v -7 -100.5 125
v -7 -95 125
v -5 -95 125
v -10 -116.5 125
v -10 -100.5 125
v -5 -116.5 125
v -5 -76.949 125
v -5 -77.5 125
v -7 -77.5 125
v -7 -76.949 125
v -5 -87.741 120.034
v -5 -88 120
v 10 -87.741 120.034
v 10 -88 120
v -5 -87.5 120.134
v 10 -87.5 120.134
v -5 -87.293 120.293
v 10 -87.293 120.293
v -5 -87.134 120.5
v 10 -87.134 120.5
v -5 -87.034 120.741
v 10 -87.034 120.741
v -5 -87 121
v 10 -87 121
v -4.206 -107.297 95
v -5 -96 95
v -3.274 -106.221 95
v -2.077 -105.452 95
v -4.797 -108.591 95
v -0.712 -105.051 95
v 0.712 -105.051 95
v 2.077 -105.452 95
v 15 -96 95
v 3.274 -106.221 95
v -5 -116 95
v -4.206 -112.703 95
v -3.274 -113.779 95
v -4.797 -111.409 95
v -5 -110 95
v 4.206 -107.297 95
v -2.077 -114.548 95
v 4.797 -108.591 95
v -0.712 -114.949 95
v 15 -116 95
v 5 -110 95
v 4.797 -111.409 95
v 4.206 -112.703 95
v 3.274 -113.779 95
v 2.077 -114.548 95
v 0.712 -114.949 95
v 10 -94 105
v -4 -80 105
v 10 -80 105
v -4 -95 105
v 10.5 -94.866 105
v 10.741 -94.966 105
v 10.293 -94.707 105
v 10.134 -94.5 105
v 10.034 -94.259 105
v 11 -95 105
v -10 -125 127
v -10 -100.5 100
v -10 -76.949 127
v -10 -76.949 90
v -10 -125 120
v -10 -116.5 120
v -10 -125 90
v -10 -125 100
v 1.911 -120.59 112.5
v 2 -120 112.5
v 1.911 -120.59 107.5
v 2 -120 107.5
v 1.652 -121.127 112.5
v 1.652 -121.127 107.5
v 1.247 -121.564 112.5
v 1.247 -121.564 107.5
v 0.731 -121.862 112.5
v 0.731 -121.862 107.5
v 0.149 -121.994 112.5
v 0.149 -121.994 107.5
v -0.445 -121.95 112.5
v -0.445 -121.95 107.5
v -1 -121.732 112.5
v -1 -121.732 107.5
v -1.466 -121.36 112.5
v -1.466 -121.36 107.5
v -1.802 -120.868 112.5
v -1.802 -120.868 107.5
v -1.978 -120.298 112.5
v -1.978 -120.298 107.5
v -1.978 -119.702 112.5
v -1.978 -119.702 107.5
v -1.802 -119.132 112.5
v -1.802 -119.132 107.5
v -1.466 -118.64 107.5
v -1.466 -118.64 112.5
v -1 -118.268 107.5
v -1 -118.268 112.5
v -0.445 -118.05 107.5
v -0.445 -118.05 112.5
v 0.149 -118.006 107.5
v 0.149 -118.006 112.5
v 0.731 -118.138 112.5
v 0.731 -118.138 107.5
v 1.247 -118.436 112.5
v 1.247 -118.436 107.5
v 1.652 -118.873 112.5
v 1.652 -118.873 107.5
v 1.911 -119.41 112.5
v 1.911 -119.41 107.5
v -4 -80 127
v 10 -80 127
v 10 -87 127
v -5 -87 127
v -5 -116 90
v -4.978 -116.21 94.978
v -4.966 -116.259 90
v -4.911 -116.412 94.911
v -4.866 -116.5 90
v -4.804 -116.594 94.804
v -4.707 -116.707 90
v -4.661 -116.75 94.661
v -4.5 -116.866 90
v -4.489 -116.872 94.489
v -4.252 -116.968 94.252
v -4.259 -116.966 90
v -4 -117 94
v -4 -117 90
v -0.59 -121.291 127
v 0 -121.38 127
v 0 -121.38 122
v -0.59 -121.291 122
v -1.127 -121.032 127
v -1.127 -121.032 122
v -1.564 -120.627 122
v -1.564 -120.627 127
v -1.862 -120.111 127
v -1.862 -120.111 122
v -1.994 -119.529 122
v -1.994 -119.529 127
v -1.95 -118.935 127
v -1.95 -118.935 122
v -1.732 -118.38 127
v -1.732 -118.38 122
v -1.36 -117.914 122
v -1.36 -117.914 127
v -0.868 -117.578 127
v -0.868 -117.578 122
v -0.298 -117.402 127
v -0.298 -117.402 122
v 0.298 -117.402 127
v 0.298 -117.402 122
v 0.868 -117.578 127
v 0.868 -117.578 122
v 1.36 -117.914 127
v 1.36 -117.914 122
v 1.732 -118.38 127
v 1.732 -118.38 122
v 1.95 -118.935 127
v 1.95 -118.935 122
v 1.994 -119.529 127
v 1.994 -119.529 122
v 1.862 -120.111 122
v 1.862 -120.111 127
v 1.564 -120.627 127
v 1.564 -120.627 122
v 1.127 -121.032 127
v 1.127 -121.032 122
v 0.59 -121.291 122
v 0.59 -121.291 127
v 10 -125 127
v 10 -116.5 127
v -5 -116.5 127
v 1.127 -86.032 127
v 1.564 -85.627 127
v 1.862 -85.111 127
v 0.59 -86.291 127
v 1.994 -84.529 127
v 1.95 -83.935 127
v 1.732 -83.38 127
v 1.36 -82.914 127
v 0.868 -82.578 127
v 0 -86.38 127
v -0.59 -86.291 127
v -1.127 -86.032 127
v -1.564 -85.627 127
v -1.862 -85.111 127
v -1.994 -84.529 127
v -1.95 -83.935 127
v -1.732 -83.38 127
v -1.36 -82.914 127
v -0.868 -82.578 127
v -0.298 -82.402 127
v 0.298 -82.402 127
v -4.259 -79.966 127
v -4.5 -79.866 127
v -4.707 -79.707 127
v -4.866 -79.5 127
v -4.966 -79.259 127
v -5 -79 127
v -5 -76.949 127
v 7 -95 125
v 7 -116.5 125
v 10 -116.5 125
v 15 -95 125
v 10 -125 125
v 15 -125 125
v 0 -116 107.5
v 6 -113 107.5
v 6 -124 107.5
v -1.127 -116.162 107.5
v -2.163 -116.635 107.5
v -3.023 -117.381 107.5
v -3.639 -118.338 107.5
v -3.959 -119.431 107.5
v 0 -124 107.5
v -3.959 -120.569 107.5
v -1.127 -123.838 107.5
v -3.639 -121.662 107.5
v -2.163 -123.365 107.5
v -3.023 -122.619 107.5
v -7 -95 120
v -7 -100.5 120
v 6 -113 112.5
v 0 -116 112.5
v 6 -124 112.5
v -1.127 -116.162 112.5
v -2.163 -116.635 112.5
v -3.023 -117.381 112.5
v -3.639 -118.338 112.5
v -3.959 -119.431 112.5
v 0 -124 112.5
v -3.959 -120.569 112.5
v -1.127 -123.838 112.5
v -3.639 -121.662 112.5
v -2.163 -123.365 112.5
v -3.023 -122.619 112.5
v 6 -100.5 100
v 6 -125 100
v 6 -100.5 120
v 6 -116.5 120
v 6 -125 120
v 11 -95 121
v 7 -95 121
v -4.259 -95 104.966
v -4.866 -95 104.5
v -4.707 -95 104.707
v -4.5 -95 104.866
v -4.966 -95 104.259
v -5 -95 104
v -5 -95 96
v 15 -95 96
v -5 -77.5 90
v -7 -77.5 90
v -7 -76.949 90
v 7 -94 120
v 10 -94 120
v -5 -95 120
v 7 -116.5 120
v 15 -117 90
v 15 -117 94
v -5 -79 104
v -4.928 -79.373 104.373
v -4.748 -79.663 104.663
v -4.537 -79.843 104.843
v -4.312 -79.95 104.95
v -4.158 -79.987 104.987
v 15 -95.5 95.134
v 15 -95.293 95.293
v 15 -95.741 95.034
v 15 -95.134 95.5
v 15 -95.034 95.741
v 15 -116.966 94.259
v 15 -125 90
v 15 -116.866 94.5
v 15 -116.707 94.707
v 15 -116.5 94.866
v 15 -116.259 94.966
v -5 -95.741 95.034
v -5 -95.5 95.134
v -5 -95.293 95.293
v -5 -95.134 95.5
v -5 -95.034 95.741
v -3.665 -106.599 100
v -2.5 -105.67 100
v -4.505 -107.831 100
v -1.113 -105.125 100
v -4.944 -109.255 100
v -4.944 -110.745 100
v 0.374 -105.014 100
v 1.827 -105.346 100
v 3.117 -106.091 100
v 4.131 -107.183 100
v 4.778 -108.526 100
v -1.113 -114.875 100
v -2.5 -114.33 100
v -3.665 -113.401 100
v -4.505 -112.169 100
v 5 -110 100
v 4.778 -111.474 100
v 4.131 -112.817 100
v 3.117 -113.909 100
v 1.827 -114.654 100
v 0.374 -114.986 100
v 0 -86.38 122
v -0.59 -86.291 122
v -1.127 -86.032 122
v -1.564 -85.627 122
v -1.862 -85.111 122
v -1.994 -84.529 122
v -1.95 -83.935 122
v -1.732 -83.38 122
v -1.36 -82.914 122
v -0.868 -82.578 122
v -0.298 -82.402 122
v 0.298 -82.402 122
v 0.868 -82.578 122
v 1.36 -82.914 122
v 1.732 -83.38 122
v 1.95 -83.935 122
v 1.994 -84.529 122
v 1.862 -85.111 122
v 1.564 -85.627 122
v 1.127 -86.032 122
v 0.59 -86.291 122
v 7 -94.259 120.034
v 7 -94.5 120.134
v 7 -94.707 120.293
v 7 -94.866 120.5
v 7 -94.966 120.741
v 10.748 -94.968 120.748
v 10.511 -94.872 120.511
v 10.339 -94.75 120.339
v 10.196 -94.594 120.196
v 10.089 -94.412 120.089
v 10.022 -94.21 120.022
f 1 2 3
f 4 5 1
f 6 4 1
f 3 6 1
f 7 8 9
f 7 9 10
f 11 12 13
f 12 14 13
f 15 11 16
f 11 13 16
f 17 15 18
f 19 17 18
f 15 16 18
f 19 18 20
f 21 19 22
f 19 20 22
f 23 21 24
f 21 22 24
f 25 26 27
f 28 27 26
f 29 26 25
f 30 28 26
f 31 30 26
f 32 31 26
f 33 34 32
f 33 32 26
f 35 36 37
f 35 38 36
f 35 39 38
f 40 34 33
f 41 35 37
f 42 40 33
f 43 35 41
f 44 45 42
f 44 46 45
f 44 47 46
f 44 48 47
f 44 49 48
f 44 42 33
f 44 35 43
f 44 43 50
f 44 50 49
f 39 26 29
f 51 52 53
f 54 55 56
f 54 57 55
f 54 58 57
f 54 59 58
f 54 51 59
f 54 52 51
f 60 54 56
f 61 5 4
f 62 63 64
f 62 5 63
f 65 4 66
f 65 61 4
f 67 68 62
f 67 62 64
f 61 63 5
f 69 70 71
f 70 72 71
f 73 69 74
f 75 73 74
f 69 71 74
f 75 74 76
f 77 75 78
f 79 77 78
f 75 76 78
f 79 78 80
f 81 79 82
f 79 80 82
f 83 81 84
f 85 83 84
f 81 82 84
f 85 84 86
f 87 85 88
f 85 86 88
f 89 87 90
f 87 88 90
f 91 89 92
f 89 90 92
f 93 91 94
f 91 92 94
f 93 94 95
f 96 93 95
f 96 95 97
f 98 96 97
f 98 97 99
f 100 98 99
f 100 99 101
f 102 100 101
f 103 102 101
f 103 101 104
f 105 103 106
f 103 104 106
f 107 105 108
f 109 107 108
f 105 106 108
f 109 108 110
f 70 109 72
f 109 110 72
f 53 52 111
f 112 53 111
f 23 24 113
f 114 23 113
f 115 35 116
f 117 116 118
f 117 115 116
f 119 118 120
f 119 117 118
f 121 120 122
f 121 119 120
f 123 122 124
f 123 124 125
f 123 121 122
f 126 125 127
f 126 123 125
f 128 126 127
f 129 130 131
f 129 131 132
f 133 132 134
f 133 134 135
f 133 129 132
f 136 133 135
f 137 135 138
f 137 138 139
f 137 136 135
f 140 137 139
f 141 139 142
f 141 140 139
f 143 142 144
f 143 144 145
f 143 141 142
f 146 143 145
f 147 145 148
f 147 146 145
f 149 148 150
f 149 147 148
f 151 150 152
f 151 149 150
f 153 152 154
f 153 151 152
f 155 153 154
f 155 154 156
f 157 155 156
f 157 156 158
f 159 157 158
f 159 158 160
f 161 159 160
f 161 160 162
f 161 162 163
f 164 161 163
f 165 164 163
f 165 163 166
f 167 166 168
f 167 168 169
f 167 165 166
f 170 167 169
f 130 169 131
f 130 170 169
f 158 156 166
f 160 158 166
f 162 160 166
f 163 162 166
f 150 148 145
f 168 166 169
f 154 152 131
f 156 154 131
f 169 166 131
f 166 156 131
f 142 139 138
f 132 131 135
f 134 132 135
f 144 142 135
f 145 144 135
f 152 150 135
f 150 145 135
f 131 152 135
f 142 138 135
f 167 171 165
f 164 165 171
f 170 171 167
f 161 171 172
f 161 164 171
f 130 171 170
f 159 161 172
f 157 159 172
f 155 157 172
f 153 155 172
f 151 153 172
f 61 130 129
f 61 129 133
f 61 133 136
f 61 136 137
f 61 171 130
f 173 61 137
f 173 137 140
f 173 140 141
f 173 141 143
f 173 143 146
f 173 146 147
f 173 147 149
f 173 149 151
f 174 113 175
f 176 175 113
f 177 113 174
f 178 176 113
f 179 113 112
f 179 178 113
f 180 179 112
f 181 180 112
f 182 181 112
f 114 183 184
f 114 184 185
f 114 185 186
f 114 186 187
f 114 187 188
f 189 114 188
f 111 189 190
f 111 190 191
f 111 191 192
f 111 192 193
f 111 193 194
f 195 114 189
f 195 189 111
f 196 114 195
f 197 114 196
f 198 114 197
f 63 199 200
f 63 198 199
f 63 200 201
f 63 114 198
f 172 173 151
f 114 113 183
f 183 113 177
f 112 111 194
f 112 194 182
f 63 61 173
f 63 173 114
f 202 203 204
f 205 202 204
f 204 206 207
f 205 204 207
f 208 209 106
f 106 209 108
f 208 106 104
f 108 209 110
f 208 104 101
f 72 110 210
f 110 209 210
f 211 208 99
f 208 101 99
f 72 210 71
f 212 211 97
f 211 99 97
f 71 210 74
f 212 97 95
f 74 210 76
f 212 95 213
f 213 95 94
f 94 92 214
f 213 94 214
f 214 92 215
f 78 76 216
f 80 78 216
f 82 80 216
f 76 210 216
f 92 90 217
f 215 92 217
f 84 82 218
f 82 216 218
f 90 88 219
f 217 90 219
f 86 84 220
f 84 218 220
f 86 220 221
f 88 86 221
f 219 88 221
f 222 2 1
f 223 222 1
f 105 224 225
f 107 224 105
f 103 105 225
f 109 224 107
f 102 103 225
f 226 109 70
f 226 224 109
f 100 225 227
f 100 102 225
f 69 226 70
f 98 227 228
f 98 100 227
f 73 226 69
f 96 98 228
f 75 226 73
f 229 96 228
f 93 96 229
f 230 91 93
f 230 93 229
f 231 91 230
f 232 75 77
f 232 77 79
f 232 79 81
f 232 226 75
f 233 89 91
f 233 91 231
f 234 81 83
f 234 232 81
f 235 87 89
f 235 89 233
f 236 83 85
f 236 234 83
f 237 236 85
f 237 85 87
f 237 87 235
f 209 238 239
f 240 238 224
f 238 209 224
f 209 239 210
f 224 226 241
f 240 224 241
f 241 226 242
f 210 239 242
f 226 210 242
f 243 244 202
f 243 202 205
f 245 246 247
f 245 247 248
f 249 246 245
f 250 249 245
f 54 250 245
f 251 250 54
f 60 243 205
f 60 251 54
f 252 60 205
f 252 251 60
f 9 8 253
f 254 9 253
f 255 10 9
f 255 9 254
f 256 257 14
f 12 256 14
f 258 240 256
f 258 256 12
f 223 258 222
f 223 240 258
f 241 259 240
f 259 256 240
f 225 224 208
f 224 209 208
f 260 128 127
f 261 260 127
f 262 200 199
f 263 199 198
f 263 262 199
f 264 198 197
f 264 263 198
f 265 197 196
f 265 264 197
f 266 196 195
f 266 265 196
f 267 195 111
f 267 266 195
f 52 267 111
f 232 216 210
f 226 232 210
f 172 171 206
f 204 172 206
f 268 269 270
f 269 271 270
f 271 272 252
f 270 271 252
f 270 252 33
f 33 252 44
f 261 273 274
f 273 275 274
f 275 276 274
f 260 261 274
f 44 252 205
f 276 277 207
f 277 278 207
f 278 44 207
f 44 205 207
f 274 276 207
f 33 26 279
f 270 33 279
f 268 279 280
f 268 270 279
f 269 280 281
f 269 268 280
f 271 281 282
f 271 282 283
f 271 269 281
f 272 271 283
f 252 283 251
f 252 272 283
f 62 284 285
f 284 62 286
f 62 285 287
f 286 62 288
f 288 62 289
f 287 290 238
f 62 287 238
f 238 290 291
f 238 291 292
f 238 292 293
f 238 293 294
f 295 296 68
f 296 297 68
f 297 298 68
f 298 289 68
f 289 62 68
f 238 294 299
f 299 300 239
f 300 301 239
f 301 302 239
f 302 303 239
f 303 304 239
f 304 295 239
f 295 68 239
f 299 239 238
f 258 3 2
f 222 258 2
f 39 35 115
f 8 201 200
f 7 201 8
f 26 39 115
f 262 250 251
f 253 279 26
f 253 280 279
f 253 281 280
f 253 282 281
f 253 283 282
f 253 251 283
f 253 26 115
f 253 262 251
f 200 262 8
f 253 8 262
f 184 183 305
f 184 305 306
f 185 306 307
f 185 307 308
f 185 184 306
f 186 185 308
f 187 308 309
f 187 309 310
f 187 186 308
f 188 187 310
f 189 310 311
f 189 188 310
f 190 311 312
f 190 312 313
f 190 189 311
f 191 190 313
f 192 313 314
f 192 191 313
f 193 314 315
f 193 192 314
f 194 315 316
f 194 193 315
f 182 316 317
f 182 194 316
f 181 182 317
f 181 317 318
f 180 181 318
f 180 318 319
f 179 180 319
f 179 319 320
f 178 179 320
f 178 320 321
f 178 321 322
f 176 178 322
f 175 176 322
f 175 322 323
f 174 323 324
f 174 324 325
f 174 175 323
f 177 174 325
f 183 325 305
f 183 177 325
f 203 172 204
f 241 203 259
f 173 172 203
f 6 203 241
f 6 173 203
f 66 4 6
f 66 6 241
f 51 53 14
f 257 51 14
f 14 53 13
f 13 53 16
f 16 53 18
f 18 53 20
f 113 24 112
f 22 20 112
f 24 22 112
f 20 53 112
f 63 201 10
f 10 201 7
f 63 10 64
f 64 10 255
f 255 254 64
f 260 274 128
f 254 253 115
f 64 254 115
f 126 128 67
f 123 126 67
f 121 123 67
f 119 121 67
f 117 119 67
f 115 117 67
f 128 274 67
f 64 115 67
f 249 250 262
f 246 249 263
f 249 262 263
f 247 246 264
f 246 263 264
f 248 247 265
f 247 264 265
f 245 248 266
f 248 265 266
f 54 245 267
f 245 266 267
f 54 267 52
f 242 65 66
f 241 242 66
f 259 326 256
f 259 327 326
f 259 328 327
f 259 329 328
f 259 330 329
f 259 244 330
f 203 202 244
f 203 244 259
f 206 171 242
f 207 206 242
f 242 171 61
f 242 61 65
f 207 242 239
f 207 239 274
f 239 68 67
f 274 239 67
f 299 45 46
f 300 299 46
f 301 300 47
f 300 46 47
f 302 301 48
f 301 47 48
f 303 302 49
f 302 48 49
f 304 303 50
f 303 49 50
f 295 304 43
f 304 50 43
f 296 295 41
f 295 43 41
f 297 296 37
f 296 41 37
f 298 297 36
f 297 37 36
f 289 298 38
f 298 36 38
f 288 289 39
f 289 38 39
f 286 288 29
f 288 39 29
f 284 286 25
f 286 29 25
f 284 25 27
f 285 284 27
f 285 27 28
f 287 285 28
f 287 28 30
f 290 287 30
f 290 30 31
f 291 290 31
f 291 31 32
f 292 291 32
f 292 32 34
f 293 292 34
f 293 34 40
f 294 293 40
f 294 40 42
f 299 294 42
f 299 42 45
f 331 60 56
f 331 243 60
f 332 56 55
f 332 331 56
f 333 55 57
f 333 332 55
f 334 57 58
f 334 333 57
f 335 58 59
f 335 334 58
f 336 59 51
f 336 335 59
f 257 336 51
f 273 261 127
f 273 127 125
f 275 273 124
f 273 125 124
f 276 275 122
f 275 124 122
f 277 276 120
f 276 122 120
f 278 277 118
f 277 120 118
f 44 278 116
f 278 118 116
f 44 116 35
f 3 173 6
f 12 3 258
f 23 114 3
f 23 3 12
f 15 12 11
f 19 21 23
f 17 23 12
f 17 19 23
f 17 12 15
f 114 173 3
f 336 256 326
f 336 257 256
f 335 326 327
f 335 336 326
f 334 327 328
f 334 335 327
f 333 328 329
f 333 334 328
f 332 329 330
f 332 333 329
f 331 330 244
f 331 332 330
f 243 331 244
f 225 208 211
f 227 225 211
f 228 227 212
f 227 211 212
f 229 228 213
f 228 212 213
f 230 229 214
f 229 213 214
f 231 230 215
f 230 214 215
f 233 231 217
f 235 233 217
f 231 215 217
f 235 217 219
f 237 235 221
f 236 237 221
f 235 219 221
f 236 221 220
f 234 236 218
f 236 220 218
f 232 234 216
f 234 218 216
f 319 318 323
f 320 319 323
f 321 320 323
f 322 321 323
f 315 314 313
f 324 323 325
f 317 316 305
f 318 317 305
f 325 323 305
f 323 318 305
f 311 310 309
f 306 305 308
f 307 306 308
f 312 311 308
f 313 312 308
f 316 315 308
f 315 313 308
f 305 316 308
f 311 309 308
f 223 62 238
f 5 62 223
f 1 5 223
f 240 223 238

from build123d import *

# Parameters (mm, degrees)
SKETCH_2_W                                 = 30
SKETCH_2_H                                 = 30
EXTRUDE_2_DEPTH                            = 15
SKETCH_3_W                                 = 21
SKETCH_3_H                                 = 25
CUT_EXTRUDE_1_DEPTH                        = 24.5
SKETCH_4_R                                 = 5
CUT_EXTRUDE_2_DEPTH                        = 37.742346142
EXTRUDE_3_DEPTH                            = 2.5
SKETCH_6_W                                 = 14
SKETCH_6_H                                 = 30
CUT_EXTRUDE_3_DEPTH                        = 5
SKETCH_8_R                                 = 2
CUT_EXTRUDE_4_DEPTH                        = 2.5
EXTRUDE_4_DEPTH                            = 10
MIRROR_18_AT_THE_SECOND_PLANE_COPY_1_SKE_W = 30
MIRROR_18_AT_THE_SECOND_PLANE_COPY_1_SKE_H = 30
MIRROR_18_AT_THE_SECOND_PLANE_COPY_1_DEPTH = 15
MIRROR_18_AT_THE_SECOND_PLANE_COPY_2_SKE_W = 21
MIRROR_18_AT_THE_SECOND_PLANE_COPY_2_SKE_H = 25
MIRROR_18_AT_THE_SECOND_PLANE_COPY_2_DEPTH = 24.5
MIRROR_18_AT_THE_SECOND_PLANE_COPY_3_SKE_R = 5
MIRROR_18_AT_THE_SECOND_PLANE_COPY_3_DEPTH = 37.742346142
MIRROR_14_AT_THE_SECOND_PLANE_COPY_1_DEPTH = 2.5
MIRROR_14_AT_THE_SECOND_PLANE_COPY_2_SKE_R = 2
MIRROR_14_AT_THE_SECOND_PLANE_COPY_2_DEPTH = 2.5
MIRROR_19_AT_THE_SECOND_PLANE_COPY_1_SKE_W = 14
MIRROR_19_AT_THE_SECOND_PLANE_COPY_1_SKE_H = 30
MIRROR_19_AT_THE_SECOND_PLANE_COPY_1_DEPTH = 5
SKETCH_10_W                                = 90
SKETCH_10_H                                = 8
EXTRUDE_5_DEPTH                            = 30
EXTRUDE_6_DEPTH                            = 15
EXTRUDE_6_DEPTH_BACK                       = 10
SKETCH_11_W                                = 7
SKETCH_11_H                                = 8.5
SKETCH_12_W                                = 140
SKETCH_12_H                                = 45
CUT_EXTRUDE_5_DEPTH                        = 2
SKETCH_15_R                                = 2.5
SKETCH_15_W                                = 15
SKETCH_15_H                                = 40
SKETCH_15_W_2                              = 25
SKETCH_15_H_2                              = 11.861851271
CUT_EXTRUDE_7_DEPTH                        = 201.124960962
SKETCH_14_R                                = 2
CUT_EXTRUDE_6_DEPTH                        = 5
FILLET_1_R                                 = 5
SKETCH_17_R                                = 2
CUT_EXTRUDE_8_DEPTH                        = 5
SKETCH_14_6_R                              = 2
CUT_EXTRUDE_9_DEPTH                        = 25
SKETCH_18_R                                = 4.3
CUT_EXTRUDE_10_DEPTH                       = 6
FILLET_2_R                                 = 1
CUT_EXTRUDE_11_DEPTH                       = 171.73371079
CUT_EXTRUDE_11_DEPTH_BACK                  = 171.73371079
SKETCH_19_W                                = 5
SKETCH_19_H                                = 200
CUT_EXTRUDE_12_DEPTH                       = 201.686322404


with BuildPart() as part:
    # 草圖2 → 填料-伸長2 (new, symmetric)
    with BuildSketch(Plane.XY):
        Rectangle(SKETCH_2_W, SKETCH_2_H)
    extrude_2 = extrude(amount=EXTRUDE_2_DEPTH, both=True)

    # 草圖3 → 除料-伸長1 (cut)
    with BuildSketch(Plane(origin=(0, 15, 0), x_dir=(1, 0, 0), z_dir=(0, 1, 0))):
        with Locations((-4.5, 2.5)):
            Rectangle(SKETCH_3_W, SKETCH_3_H)
    cut_extrude_1 = extrude(amount=-CUT_EXTRUDE_1_DEPTH, mode=Mode.SUBTRACT)

    # 草圖4 → 除料-伸長2 (cut, through all)
    with BuildSketch(Plane.XY.offset(15)):
        Circle(SKETCH_4_R)
    cut_extrude_2 = extrude(amount=-CUT_EXTRUDE_2_DEPTH, mode=Mode.SUBTRACT)

    # 草圖6 → 除料-伸長3 (cut)
    with BuildSketch(Plane(origin=(0, 0, -15), x_dir=(-1, 0, 0), z_dir=(0, 0, -1))):
        Rectangle(SKETCH_6_W, SKETCH_6_H)
    cut_extrude_3 = extrude(amount=-CUT_EXTRUDE_3_DEPTH, mode=Mode.SUBTRACT)

    # 草圖9 → 填料-伸長4 (add)
    with BuildSketch(Plane.ZY.offset(15)):
        Polygon((-45, 15), (-10, 15), (-10, -9.5), (10, -9.5), (10, 15), (100, 15), (100, -9.5), (120, -9.5), (120, 15), (155, 15), (155, -125), (120, -125), (120, -100.5), (100, -100.5), (100, -125), (10, -125), (10, -100.5), (-10, -100.5), (-10, -125), (-45, -125), align=None)
    extrude(amount=-EXTRUDE_4_DEPTH)

    # 鏡射18: 填料-伸長2, 除料-伸長1, 除料-伸長2 across plane
    add(extrude_2.mirror(Plane.ZX.offset(-55)))
    add(cut_extrude_1.mirror(Plane.ZX.offset(-55)), mode=Mode.SUBTRACT)
    add(cut_extrude_2.mirror(Plane.ZX.offset(-55)), mode=Mode.SUBTRACT)

    # 鏡射18 at the second plane: 填料-伸長2, 除料-伸長1, 除料-伸長2 across plane
    add(extrude_2.mirror(Plane.XY.offset(55)))
    add(cut_extrude_1.mirror(Plane.XY.offset(55)), mode=Mode.SUBTRACT)
    add(cut_extrude_2.mirror(Plane.XY.offset(55)), mode=Mode.SUBTRACT)

    # 鏡射18 at the second plane copy 1 ske → 鏡射18 at the second plane copy 1 (add, symmetric)
    with BuildSketch(Plane(origin=(0, -110, 110), x_dir=(1, 0, 0), z_dir=(0, 0, -1))):
        Rectangle(MIRROR_18_AT_THE_SECOND_PLANE_COPY_1_SKE_W, MIRROR_18_AT_THE_SECOND_PLANE_COPY_1_SKE_H)
    extrude(amount=MIRROR_18_AT_THE_SECOND_PLANE_COPY_1_DEPTH, both=True)

    # 鏡射18 at the second plane copy 2 ske → 鏡射18 at the second plane copy 2 (cut)
    with BuildSketch(Plane(origin=(0, -125, 110), x_dir=(1, 0, 0), z_dir=(0, -1, 0))):
        with Locations((-4.5, 2.5)):
            Rectangle(MIRROR_18_AT_THE_SECOND_PLANE_COPY_2_SKE_W, MIRROR_18_AT_THE_SECOND_PLANE_COPY_2_SKE_H)
    extrude(amount=-MIRROR_18_AT_THE_SECOND_PLANE_COPY_2_DEPTH, mode=Mode.SUBTRACT)

    # 鏡射18 at the second plane copy 3 ske → 鏡射18 at the second plane copy 3 (cut, through all)
    with BuildSketch(Plane(origin=(0, -110, 95), x_dir=(1, 0, 0), z_dir=(0, 0, -1))):
        Circle(MIRROR_18_AT_THE_SECOND_PLANE_COPY_3_SKE_R)
    extrude(amount=-MIRROR_18_AT_THE_SECOND_PLANE_COPY_3_DEPTH, mode=Mode.SUBTRACT)


with BuildPart() as body_2:
    # 草圖5 → 填料-伸長3 (new, symmetric)
    with BuildSketch(Plane.XY):
        with BuildLine():
            Line((0, 14), (6, 14))
            Line((6, 14), (6, 6))
            Line((6, 6), (6, 3))
            Line((6, 3), (0, 6))
            ThreePointArc((0, 6), (-4, 10), (0, 14))
        make_face()
    extrude_3 = extrude(amount=EXTRUDE_3_DEPTH, both=True)

    # 草圖8 → 除料-伸長4 (cut, symmetric)
    with BuildSketch(Plane.XY):
        with Locations((0, 10)):
            Circle(SKETCH_8_R)
    cut_extrude_4 = extrude(amount=CUT_EXTRUDE_4_DEPTH, both=True, mode=Mode.SUBTRACT)


with BuildPart() as part_1:
    add(part.part)

    # 鏡射14: 填料-伸長3, 除料-伸長4 across plane
    add(extrude_3.mirror(Plane.ZX.offset(-55)))
    add(cut_extrude_4.mirror(Plane.ZX.offset(-55)), mode=Mode.SUBTRACT)

    # 鏡射14 at the second plane: 填料-伸長3, 除料-伸長4 across plane
    add(extrude_3.mirror(Plane.XY.offset(55)))
    add(cut_extrude_4.mirror(Plane.XY.offset(55)), mode=Mode.SUBTRACT)

    # 鏡射14 at the second plane copy 1 ske → 鏡射14 at the second plane copy 1 (add, symmetric)
    with BuildSketch(Plane(origin=(0, -110, 110), x_dir=(1, 0, 0), z_dir=(0, 0, -1))):
        with BuildLine():
            Line((0, 14), (6, 14))
            Line((6, 14), (6, 6))
            Line((6, 6), (6, 3))
            Line((6, 3), (0, 6))
            ThreePointArc((0, 6), (-4, 10), (0, 14))
        make_face()
    extrude(amount=MIRROR_14_AT_THE_SECOND_PLANE_COPY_1_DEPTH, both=True)

    # 鏡射14 at the second plane copy 2 ske → 鏡射14 at the second plane copy 2 (cut, symmetric)
    with BuildSketch(Plane(origin=(0, -110, 110), x_dir=(1, 0, 0), z_dir=(0, 0, -1))):
        with Locations((0, 10)):
            Circle(MIRROR_14_AT_THE_SECOND_PLANE_COPY_2_SKE_R)
    extrude(amount=MIRROR_14_AT_THE_SECOND_PLANE_COPY_2_DEPTH, both=True, mode=Mode.SUBTRACT)

    # 鏡射19: 除料-伸長3 across plane
    add(cut_extrude_3.mirror(Plane.XY.offset(55)), mode=Mode.SUBTRACT)

    # 鏡射19 at the second plane: 除料-伸長3 across plane
    add(cut_extrude_3.mirror(Plane.ZX.offset(-55)), mode=Mode.SUBTRACT)

    # 鏡射19 at the second plane copy 1 ske → 鏡射19 at the second plane copy 1 (cut)
    with BuildSketch(Plane(origin=(0, -110, 125), x_dir=(-1, 0, 0), z_dir=(0, 0, 1))):
        Rectangle(MIRROR_19_AT_THE_SECOND_PLANE_COPY_1_SKE_W, MIRROR_19_AT_THE_SECOND_PLANE_COPY_1_SKE_H)
    extrude(amount=-MIRROR_19_AT_THE_SECOND_PLANE_COPY_1_DEPTH, mode=Mode.SUBTRACT)

    # 草圖10 → 填料-伸長5 (add)
    with BuildSketch(Plane.ZY.offset(15)):
        with Locations((55, 11)):
            Rectangle(SKETCH_10_W, SKETCH_10_H)
        with Locations((55, -121)):
            Rectangle(SKETCH_10_W, SKETCH_10_H)
    extrude(amount=-EXTRUDE_5_DEPTH)

    # 草圖11 → 填料-伸長6 (add, two sides: drawn at the far end of the back side and taken through both)
    with BuildSketch(Plane(origin=(-5, 0, 0), x_dir=(0, 0, -1), z_dir=(1, 0, 0)).offset(-EXTRUDE_6_DEPTH_BACK)):
        with Locations((13.5, 10.75)):
            Rectangle(SKETCH_11_W, SKETCH_11_H)
        with Locations((13.5, -120.75)):
            Rectangle(SKETCH_11_W, SKETCH_11_H)
        Polygon((12.973156493, -80), (17, -80), (17, -87), (10, -87), (10, -95), (-5, -95), (-5, -80), align=None)
        with Locations((-123.5, -120.75)):
            Rectangle(SKETCH_11_W, SKETCH_11_H)
        Polygon((-120, -87), (-127, -87), (-127, -80), (-122.973156493, -80), (-105, -80), (-105, -95), (-120, -95), align=None)
        Polygon((10, -23), (17, -23), (17, -30), (12.973156493, -30), (-5, -30), (-5, -15), (10, -15), align=None)
        Polygon((-122.973156493, -30), (-127, -30), (-127, -23), (-120, -23), (-120, -15), (-105, -15), (-105, -30), align=None)
        with Locations((-123.5, 10.75)):
            Rectangle(SKETCH_11_W, SKETCH_11_H)
    extrude(amount=EXTRUDE_6_DEPTH + EXTRUDE_6_DEPTH_BACK)

    # 草圖12 → 除料-伸長5 (cut)
    with BuildSketch(Plane(origin=(-5, 0, 0), x_dir=(0, 0, -1), z_dir=(1, 0, 0))):
        with Locations((-55, -55)):
            Rectangle(SKETCH_12_W, SKETCH_12_H)
    extrude(amount=-CUT_EXTRUDE_5_DEPTH, mode=Mode.SUBTRACT)

    # 草圖15 → 除料-伸長7 (cut, through all)
    with BuildSketch(Plane(origin=(-5, 0, 0), x_dir=(0, 0, -1), z_dir=(1, 0, 0))):
        with Locations(Location((30, -90, 0), (0, 0, 270))):
            Circle(SKETCH_15_R)
        with Locations(Location((-55, -90, 0), (0, 0, 270))):
            Circle(SKETCH_15_R)
        with Locations(Location((-140, -90, 0), (0, 0, 270))):
            Circle(SKETCH_15_R)
        with Locations(Location((-140, -20, 0), (0, 0, 90))):
            Circle(SKETCH_15_R)
        with Locations(Location((30, -20, 0), (0, 0, 90))):
            Circle(SKETCH_15_R)
        with Locations(Location((-55, -20, 0), (0, 0, 90))):
            Circle(SKETCH_15_R)
        with Locations((-139.005709801, -55)):
            Rectangle(SKETCH_15_W, SKETCH_15_H)
        with Locations((29.005709801, -55)):
            Rectangle(SKETCH_15_W, SKETCH_15_H)
        with Locations((-77.5, -30)):
            Rectangle(SKETCH_15_W_2, SKETCH_15_H)
        with Locations((-77.5, -80)):
            Rectangle(SKETCH_15_W_2, SKETCH_15_H)
        with Locations((-32.5, -80)):
            Rectangle(SKETCH_15_W_2, SKETCH_15_H)
        with Locations((-32.5, -30)):
            Rectangle(SKETCH_15_W_2, SKETCH_15_H)
        with Locations((-139.005709801, -106.804819835)):
            Rectangle(SKETCH_15_W, SKETCH_15_H_2)
        with Locations((-139.005709801, -3.195180166)):
            Rectangle(SKETCH_15_W, SKETCH_15_H_2)
        with Locations((29.005709801, -106.804819835)):
            Rectangle(SKETCH_15_W, SKETCH_15_H_2)
        with Locations((29.005709801, -3.195180166)):
            Rectangle(SKETCH_15_W, SKETCH_15_H_2)
    extrude(amount=-CUT_EXTRUDE_7_DEPTH, mode=Mode.SUBTRACT)

    # 草圖14 → 除料-伸長6 (cut)
    with BuildSketch(Plane(origin=(15, 0, 0), x_dir=(0, 0, -1), z_dir=(1, 0, 0))):
        with Locations(Location((-55, 11, 0), (0, 0, 90))):
            Circle(SKETCH_14_R)
        with Locations(Location((-55, -121, 0), (0, 0, 270))):
            Circle(SKETCH_14_R)
    extrude(amount=-CUT_EXTRUDE_6_DEPTH, mode=Mode.SUBTRACT)

    # 圓角1
    fillet_1_edges = [part_1.edges().sort_by_distance(p)[0] for p in [
        (-10, -125, -45),
        (-10, 15, -45),
        (-10, 15, 155),
        (-10, -125, 155),
        (-10, -75, 146.505709801),
        (-10, -35, 146.505709801),
        (-10, -35, 131.505709801),
        (-10, -75, 131.505709801),
        (-10, -35, -36.505709801),
        (-10, -75, -36.505709801),
        (-10, -75, -21.505709801),
        (-10, -35, -21.505709801),
    ]]
    fillet(fillet_1_edges, radius=FILLET_1_R)

    # 草圖17 → 除料-伸長8 (cut)
    with BuildSketch(Plane(origin=(0, 0, -17), x_dir=(-1, 0, 0), z_dir=(0, 0, -1))):
        with Locations(Location((0, 9.38, 0), (0, 0, 90))):
            Circle(SKETCH_17_R)
        with Locations(Location((0, -25.62, 0), (0, 0, 90))):
            Circle(SKETCH_17_R)
        with Locations(Location((0, -84.38, 0), (0, 0, 270))):
            Circle(SKETCH_17_R)
        with Locations(Location((0, -119.38, 0), (0, 0, 270))):
            Circle(SKETCH_17_R)
    cut_extrude_8 = extrude(amount=-CUT_EXTRUDE_8_DEPTH, mode=Mode.SUBTRACT)

    # 鏡射20: 除料-伸長8 across plane
    add(cut_extrude_8.mirror(Plane.XY.offset(55)), mode=Mode.SUBTRACT)

    # 草圖14<6> → 除料-伸長9 (cut)
    with BuildSketch(Plane(origin=(15, 0, 0), x_dir=(0, 0, -1), z_dir=(1, 0, 0))):
        with Locations(Location((39, 9, 0), (0, 0, 90))):
            Circle(SKETCH_14_6_R)
        with Locations(Location((-149, 9, 0), (0, 0, 270))):
            Circle(SKETCH_14_6_R)
        with Locations(Location((39, -119, 0), (0, 0, 270))):
            Circle(SKETCH_14_6_R)
        with Locations(Location((-149, -119, 0), (0, 0, 90))):
            Circle(SKETCH_14_6_R)
    extrude(amount=-CUT_EXTRUDE_9_DEPTH, mode=Mode.SUBTRACT)

    # 草圖18 → 除料-伸長10 (cut)
    with BuildSketch(Plane(origin=(-5, 0, 0), x_dir=(0, 0, -1), z_dir=(1, 0, 0))):
        with Locations(Location((30, -90, 0), (0, 0, 90))):
            Circle(SKETCH_18_R)
        with Locations(Location((-55, -90, 0), (0, 0, 90))):
            Circle(SKETCH_18_R)
        with Locations(Location((-140, -90, 0), (0, 0, 90))):
            Circle(SKETCH_18_R)
        with Locations(Location((-140, -20, 0), (0, 0, 90))):
            Circle(SKETCH_18_R)
        with Locations(Location((-55, -20, 0), (0, 0, 90))):
            Circle(SKETCH_18_R)
        with Locations(Location((30, -20, 0), (0, 0, 90))):
            Circle(SKETCH_18_R)
    extrude(amount=-CUT_EXTRUDE_10_DEPTH, mode=Mode.SUBTRACT)

    # 圓角2
    fillet_2_edges = [part_1.edges().sort_by_distance(p)[0] for p in [
        (5, -15, 95),
        (5, -95, 15),
        (5, -95, 95),
        (-5, 7, 55),
        (5, 7, 15),
        (5, 7, 95),
        (-5, -117, 55),
        (5, -117, 15),
        (5, -117, 95),
        (-5, -80, 116),
        (2.5, -87, 120),
        (8.5, -95, 120),
        (-5, -87.5, 105),
        (10, -95, 112.5),
        (-5, -22.5, 105),
        (-5, -30, 116),
        (2.5, -23, 120),
        (8.5, -15, 120),
        (10, -15, 112.5),
        (-5, -30, -6),
        (8.5, -15, -10),
        (2.5, -23, -10),
        (10, -15, -2.5),
        (5, -15, 15),
        (-5, -80, -6),
        (2.5, -87, -10),
        (8.5, -95, -10),
        (10, -95, -2.5),
    ]]
    fillet(fillet_2_edges, radius=FILLET_2_R)

    # 草圖19 → 除料-伸長11 (cut, two sides: drawn at the far end of the back side and taken through both)
    with BuildSketch(Plane(origin=(0, -55, 0), x_dir=(1, 0, 0), z_dir=(0, 1, 0)).offset(-CUT_EXTRUDE_11_DEPTH_BACK)):
        Polygon((-5, -20), (-5, -38.623236893), (10, -20), align=None)
        Polygon((10, -26.376763107), (-5, -45), (10, -45), align=None)
        Polygon((10, -90), (-5, -90), (-5, -71.376763107), align=None)
        Polygon((-5, -65), (10, -65), (10, -83.623236893), align=None)
        with Locations((-12.5, -55)):
            Rectangle(SKETCH_19_W, SKETCH_19_H)
    extrude(amount=CUT_EXTRUDE_11_DEPTH + CUT_EXTRUDE_11_DEPTH_BACK, mode=Mode.SUBTRACT)


with BuildPart() as cut_extrude_12_tool:
    # 草圖20 → 除料-伸長12 (new, through all)
    with BuildSketch(Plane(origin=(15, 0, 0), x_dir=(0, 0, -1), z_dir=(1, 0, 0))):
        Polygon((-127, -125), (-127, -76.948600706), (-90, -76.948600706), (-90, -125), (55.024722499, -125), (55.024722499, 33.114224964), (-156.187885381, 33.114224964), (-156.187885381, -125), align=None)
    extrude(amount=-CUT_EXTRUDE_12_DEPTH)


with BuildPart() as part_2:
    add(part_1.part)

    # 除料-伸長12: cut by cut_extrude_12_tool
    add(cut_extrude_12_tool.part, mode=Mode.SUBTRACT)


with BuildPart() as body_2_1:
    add(body_2.part)

    # 除料-伸長12: cut by cut_extrude_12_tool
    add(cut_extrude_12_tool.part, mode=Mode.SUBTRACT)


solid = part_2.part
